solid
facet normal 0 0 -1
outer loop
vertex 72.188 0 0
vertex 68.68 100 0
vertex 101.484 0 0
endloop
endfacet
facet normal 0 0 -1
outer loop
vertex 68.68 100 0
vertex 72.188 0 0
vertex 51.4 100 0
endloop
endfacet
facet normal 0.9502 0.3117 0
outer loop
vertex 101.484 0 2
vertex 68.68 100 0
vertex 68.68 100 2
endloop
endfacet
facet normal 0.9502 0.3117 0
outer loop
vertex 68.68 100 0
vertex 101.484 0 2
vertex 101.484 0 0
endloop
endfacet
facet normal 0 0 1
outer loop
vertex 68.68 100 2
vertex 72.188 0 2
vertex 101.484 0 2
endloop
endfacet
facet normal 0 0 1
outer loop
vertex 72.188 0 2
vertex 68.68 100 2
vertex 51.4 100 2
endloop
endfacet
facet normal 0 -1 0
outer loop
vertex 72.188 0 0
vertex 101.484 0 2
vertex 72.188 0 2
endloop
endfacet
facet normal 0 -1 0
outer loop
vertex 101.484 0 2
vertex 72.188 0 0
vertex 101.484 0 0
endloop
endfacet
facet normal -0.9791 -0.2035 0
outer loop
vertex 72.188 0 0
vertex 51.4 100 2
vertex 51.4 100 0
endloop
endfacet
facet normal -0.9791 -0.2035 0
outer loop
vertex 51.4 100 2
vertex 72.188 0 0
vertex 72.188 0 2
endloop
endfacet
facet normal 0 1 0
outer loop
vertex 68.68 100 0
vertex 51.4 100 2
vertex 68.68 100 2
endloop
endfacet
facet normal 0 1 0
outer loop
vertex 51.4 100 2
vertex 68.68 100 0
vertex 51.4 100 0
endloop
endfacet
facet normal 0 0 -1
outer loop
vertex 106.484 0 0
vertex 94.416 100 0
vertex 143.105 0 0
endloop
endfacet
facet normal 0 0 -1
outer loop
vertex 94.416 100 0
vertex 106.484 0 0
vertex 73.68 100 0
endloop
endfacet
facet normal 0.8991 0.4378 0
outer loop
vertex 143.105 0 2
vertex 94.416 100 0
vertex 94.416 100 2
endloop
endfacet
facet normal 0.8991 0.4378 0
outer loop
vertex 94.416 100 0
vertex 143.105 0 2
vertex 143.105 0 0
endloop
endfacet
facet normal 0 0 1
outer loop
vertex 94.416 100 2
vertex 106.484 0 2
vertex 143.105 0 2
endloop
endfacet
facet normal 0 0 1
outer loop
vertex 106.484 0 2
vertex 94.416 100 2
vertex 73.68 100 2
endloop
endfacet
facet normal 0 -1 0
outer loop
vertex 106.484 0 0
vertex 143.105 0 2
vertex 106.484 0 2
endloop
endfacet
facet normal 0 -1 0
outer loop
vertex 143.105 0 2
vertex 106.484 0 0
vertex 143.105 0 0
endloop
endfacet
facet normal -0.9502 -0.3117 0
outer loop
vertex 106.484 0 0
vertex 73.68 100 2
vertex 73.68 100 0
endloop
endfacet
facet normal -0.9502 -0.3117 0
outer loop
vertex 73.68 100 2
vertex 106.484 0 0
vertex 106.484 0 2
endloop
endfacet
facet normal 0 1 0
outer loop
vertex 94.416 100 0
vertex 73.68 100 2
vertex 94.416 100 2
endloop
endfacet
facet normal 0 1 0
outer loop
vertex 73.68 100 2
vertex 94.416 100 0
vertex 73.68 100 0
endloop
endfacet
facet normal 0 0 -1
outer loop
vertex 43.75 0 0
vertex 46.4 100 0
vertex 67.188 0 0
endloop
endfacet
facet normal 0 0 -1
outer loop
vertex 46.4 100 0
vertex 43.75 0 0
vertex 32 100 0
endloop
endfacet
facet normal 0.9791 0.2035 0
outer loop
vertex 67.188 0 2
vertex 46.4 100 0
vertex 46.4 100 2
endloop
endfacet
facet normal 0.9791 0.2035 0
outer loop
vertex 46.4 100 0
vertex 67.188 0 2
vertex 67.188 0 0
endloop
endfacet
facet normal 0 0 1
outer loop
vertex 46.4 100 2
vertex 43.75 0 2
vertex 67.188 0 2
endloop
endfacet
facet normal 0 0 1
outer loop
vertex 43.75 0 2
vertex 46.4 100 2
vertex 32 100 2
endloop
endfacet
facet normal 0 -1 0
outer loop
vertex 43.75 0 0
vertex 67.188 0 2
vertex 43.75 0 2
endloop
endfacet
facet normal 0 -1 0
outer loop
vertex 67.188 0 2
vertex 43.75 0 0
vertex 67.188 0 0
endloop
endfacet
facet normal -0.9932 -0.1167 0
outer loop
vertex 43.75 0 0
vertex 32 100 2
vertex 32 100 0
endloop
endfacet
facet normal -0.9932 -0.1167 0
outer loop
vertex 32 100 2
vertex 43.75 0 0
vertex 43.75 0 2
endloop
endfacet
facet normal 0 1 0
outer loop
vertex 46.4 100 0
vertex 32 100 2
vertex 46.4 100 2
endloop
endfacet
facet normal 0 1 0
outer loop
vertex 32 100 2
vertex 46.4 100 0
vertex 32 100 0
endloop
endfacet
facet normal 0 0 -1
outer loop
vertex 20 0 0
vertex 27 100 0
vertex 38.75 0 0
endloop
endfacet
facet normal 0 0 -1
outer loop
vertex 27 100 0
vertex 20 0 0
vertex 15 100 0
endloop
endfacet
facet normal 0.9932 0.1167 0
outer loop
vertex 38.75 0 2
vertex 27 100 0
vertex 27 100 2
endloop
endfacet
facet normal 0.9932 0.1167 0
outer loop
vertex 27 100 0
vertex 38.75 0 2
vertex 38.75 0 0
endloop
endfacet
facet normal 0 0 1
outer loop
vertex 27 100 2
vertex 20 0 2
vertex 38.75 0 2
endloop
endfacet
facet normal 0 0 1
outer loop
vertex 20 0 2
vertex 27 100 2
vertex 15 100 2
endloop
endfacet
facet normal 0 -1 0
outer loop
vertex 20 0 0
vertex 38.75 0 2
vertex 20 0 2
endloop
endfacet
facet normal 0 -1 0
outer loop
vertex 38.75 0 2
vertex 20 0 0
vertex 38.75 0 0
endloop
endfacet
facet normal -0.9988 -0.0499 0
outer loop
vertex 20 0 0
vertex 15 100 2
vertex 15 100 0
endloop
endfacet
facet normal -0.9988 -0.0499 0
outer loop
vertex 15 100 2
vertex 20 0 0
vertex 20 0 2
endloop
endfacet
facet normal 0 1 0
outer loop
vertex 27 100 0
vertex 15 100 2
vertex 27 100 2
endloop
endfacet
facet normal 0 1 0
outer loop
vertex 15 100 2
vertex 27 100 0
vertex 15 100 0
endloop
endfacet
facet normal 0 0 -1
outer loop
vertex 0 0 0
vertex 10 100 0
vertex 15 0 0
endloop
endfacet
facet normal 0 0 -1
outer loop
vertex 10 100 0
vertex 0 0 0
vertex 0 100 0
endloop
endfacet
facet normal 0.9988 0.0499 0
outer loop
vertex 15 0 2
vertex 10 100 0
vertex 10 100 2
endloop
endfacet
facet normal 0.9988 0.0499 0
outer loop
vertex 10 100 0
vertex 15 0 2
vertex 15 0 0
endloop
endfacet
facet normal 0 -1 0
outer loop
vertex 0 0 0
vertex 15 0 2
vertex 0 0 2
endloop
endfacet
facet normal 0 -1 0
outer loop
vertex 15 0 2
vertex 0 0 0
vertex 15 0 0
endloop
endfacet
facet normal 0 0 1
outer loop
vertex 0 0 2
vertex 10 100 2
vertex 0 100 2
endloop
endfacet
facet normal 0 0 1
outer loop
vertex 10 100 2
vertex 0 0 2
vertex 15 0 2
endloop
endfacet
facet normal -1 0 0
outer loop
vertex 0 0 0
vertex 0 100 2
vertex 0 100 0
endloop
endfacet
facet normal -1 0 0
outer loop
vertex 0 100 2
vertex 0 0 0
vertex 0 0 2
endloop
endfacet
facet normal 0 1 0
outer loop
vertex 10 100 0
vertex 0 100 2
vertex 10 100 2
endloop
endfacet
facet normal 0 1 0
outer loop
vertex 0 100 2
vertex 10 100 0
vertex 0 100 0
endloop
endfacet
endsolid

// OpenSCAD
// Increasingly wide quadrilaterals

// TODO
// - Option to create a reflected pair of patterns
// - Option for a spine between reflected pair

/* [Quads] */

// [Count]
_QuadCount = 5;

// [Height]
_QuadHeight = 100;

// [Bottom Thickness]
_QuadBottomThickness = 2.0;

// [Top Thickness]
_QuadTopThickness = 2.0;

// [Quad-to-quad Gap]
_QuadGap = 5;

// [Starting Top Width]
_QuadStartTopWidth = 10;

// [Starting Bottom Width]
_QuadStartBottomWidth = 15;

// [Additonal Top Width %]
_QuadAddTopWidthPct = 0.20;

// Additional Bottom Width %]
_QuadAddBottomWidthPct = 0.25;

/* [Extruders] */

// [Extruder 1]
_QuadExtruder1 = true;

// [Extruder 2]
_QuadExtruder2 = true;

// [Extruder 3]
_QuadExtruder3 = true;

// [Extruder 4]
_QuadExtruder4 = true;

// [Extruder 5]
_QuadExtruder5 = true;

// [Extruder to render]
_WhichExtruder = "All"; // ["All", 1, 2, 3, 4, 5]

// Map a value of Extruder to an OpenSCAD color
function ExtruderColor(Extruder) = 
  (Extruder == 1  ) ? "red"    : 
  (Extruder == 2  ) ? "green"  : 
  (Extruder == 3  ) ? "blue"   : 
  (Extruder == 4  ) ? "pink"   :
  (Extruder == 5  ) ? "yellow" :
                      "purple" ;
					  
// If _WhichExtruder is "All" or is not "All" and matches the requested extruder, render 
// the child nodes.

module Extruder(DoExtruder)
{
	color(ExtruderColor(DoExtruder))
	{
		if (_WhichExtruder == "All" || DoExtruder == _WhichExtruder)
		{
			children();
		}
	}
}

// Quad - Render a single quad, then recurse to render the next one at +X
module Quad(QuadCount, QuadN, Height, BottomThickness, TopThickness, Gap, TopWidth, BottomWidth, AddTopWidthPct, AddBottomWidthPct, BottomX, TopX, QuadExtruders)
{
	echo("Quad(", "Count=", QuadCount, "N=", QuadN, "H=", Height, "BT=", BottomThickness, "TT=", TopThickness, "G=", Gap, "TW=", TopWidth, "BW=", BottomWidth, "ATWP=",AddTopWidthPct, "ABWP=", AddBottomWidthPct, "BX=", BottomX, "TX=", TopX, "Ex=", QuadExtruders, ")"); 
	
	PT0 = [BottomX + 0,           0,      0];
	PT1 = [BottomX + BottomWidth, 0,      0];
	PT4 = [BottomX + 0,           0,      BottomThickness];
	PT5 = [BottomX + BottomWidth, 0,      BottomThickness];
	
	PT2 = [TopX + TopWidth,    Height, 0];
	PT3 = [TopX + 0,           Height, 0];
	PT6 = [TopX + TopWidth,    Height, TopThickness];
	PT7=  [TopX + 0,           Height, TopThickness];
	
	PolyhedronPoints =
	[
		PT0, PT1, PT2, PT3, PT4, PT5, PT6, PT7
	];
	
	PolyhedronFaces =
	[
		[0, 1, 2, 3],
		[4, 5, 1, 0],
		[7, 6, 5, 4],
		[5, 6, 2, 1],
		[6, 7, 3, 2],
		[7, 4, 0, 3]
	];

	Ex = ((QuadCount - QuadN) % len(QuadExtruders)) + 1;
	
	Extruder(Ex)
	{
		polyhedron(PolyhedronPoints, PolyhedronFaces);
	}
	
    if (QuadN > 1)
    {
        Quad(QuadCount, QuadN - 1, Height, BottomThickness, TopThickness, Gap, TopWidth + (TopWidth * AddTopWidthPct), BottomWidth + (BottomWidth * AddBottomWidthPct), AddTopWidthPct, AddBottomWidthPct, BottomX + BottomWidth + Gap, TopX + TopWidth + Gap, QuadExtruders);
     }
}

// Quads - Render QuadCount quads, starting at 0,0 and proceeding to +X
module Quads(QuadCount, QuadHeight, QuadBottomThickness, QuadTopThickness, QuadGap, QuadStartTopWidth, QuadStartBottomWidth, QuadAddTopWidthPct, QuadAddBottomWidthPct, QuadBottomX, QuadTopX, QuadExtruders)
{
    Quad(QuadCount, QuadCount, QuadHeight, QuadBottomThickness, QuadTopThickness, QuadGap, QuadStartTopWidth, QuadStartBottomWidth, QuadAddTopWidthPct, QuadAddBottomWidthPct, QuadBottomX, QuadTopX, QuadExtruders);
}

module main(QuadCount, QuadHeight, QuadBottomThickness, QuadTopThickness, QuadGap, QuadStartTopWidth, QuadStartBottomWidth, QuadAddTopWidthPct, QuadAddBottomWidthPct, QuadExtruder1, QuadExtruder2, QuadExtruder3,QuadExtruder4, QuadExtruder5)
{
    AllQuadExtruders = 
    [
        QuadExtruder1 ? 1 : 0, 
        QuadExtruder2 ? 2 : 0,
        QuadExtruder3 ? 3 : 0,
        QuadExtruder4 ? 4 : 0, 
        QuadExtruder5 ? 5 : 0
    ];
    
    QuadExtruders = [for (E = AllQuadExtruders) if (E != 0) E];

    Quads(QuadCount, QuadHeight, QuadBottomThickness, QuadTopThickness, QuadGap, QuadStartTopWidth, QuadStartBottomWidth, QuadAddTopWidthPct, QuadAddBottomWidthPct, 0, 0, QuadExtruders);
}

main(_QuadCount, _QuadHeight, _QuadBottomThickness, _QuadTopThickness, _QuadGap, _QuadStartTopWidth, _QuadStartBottomWidth, _QuadAddTopWidthPct, _QuadAddBottomWidthPct, _QuadExtruder1, _QuadExtruder2, _QuadExtruder3,_QuadExtruder4, _QuadExtruder5);
